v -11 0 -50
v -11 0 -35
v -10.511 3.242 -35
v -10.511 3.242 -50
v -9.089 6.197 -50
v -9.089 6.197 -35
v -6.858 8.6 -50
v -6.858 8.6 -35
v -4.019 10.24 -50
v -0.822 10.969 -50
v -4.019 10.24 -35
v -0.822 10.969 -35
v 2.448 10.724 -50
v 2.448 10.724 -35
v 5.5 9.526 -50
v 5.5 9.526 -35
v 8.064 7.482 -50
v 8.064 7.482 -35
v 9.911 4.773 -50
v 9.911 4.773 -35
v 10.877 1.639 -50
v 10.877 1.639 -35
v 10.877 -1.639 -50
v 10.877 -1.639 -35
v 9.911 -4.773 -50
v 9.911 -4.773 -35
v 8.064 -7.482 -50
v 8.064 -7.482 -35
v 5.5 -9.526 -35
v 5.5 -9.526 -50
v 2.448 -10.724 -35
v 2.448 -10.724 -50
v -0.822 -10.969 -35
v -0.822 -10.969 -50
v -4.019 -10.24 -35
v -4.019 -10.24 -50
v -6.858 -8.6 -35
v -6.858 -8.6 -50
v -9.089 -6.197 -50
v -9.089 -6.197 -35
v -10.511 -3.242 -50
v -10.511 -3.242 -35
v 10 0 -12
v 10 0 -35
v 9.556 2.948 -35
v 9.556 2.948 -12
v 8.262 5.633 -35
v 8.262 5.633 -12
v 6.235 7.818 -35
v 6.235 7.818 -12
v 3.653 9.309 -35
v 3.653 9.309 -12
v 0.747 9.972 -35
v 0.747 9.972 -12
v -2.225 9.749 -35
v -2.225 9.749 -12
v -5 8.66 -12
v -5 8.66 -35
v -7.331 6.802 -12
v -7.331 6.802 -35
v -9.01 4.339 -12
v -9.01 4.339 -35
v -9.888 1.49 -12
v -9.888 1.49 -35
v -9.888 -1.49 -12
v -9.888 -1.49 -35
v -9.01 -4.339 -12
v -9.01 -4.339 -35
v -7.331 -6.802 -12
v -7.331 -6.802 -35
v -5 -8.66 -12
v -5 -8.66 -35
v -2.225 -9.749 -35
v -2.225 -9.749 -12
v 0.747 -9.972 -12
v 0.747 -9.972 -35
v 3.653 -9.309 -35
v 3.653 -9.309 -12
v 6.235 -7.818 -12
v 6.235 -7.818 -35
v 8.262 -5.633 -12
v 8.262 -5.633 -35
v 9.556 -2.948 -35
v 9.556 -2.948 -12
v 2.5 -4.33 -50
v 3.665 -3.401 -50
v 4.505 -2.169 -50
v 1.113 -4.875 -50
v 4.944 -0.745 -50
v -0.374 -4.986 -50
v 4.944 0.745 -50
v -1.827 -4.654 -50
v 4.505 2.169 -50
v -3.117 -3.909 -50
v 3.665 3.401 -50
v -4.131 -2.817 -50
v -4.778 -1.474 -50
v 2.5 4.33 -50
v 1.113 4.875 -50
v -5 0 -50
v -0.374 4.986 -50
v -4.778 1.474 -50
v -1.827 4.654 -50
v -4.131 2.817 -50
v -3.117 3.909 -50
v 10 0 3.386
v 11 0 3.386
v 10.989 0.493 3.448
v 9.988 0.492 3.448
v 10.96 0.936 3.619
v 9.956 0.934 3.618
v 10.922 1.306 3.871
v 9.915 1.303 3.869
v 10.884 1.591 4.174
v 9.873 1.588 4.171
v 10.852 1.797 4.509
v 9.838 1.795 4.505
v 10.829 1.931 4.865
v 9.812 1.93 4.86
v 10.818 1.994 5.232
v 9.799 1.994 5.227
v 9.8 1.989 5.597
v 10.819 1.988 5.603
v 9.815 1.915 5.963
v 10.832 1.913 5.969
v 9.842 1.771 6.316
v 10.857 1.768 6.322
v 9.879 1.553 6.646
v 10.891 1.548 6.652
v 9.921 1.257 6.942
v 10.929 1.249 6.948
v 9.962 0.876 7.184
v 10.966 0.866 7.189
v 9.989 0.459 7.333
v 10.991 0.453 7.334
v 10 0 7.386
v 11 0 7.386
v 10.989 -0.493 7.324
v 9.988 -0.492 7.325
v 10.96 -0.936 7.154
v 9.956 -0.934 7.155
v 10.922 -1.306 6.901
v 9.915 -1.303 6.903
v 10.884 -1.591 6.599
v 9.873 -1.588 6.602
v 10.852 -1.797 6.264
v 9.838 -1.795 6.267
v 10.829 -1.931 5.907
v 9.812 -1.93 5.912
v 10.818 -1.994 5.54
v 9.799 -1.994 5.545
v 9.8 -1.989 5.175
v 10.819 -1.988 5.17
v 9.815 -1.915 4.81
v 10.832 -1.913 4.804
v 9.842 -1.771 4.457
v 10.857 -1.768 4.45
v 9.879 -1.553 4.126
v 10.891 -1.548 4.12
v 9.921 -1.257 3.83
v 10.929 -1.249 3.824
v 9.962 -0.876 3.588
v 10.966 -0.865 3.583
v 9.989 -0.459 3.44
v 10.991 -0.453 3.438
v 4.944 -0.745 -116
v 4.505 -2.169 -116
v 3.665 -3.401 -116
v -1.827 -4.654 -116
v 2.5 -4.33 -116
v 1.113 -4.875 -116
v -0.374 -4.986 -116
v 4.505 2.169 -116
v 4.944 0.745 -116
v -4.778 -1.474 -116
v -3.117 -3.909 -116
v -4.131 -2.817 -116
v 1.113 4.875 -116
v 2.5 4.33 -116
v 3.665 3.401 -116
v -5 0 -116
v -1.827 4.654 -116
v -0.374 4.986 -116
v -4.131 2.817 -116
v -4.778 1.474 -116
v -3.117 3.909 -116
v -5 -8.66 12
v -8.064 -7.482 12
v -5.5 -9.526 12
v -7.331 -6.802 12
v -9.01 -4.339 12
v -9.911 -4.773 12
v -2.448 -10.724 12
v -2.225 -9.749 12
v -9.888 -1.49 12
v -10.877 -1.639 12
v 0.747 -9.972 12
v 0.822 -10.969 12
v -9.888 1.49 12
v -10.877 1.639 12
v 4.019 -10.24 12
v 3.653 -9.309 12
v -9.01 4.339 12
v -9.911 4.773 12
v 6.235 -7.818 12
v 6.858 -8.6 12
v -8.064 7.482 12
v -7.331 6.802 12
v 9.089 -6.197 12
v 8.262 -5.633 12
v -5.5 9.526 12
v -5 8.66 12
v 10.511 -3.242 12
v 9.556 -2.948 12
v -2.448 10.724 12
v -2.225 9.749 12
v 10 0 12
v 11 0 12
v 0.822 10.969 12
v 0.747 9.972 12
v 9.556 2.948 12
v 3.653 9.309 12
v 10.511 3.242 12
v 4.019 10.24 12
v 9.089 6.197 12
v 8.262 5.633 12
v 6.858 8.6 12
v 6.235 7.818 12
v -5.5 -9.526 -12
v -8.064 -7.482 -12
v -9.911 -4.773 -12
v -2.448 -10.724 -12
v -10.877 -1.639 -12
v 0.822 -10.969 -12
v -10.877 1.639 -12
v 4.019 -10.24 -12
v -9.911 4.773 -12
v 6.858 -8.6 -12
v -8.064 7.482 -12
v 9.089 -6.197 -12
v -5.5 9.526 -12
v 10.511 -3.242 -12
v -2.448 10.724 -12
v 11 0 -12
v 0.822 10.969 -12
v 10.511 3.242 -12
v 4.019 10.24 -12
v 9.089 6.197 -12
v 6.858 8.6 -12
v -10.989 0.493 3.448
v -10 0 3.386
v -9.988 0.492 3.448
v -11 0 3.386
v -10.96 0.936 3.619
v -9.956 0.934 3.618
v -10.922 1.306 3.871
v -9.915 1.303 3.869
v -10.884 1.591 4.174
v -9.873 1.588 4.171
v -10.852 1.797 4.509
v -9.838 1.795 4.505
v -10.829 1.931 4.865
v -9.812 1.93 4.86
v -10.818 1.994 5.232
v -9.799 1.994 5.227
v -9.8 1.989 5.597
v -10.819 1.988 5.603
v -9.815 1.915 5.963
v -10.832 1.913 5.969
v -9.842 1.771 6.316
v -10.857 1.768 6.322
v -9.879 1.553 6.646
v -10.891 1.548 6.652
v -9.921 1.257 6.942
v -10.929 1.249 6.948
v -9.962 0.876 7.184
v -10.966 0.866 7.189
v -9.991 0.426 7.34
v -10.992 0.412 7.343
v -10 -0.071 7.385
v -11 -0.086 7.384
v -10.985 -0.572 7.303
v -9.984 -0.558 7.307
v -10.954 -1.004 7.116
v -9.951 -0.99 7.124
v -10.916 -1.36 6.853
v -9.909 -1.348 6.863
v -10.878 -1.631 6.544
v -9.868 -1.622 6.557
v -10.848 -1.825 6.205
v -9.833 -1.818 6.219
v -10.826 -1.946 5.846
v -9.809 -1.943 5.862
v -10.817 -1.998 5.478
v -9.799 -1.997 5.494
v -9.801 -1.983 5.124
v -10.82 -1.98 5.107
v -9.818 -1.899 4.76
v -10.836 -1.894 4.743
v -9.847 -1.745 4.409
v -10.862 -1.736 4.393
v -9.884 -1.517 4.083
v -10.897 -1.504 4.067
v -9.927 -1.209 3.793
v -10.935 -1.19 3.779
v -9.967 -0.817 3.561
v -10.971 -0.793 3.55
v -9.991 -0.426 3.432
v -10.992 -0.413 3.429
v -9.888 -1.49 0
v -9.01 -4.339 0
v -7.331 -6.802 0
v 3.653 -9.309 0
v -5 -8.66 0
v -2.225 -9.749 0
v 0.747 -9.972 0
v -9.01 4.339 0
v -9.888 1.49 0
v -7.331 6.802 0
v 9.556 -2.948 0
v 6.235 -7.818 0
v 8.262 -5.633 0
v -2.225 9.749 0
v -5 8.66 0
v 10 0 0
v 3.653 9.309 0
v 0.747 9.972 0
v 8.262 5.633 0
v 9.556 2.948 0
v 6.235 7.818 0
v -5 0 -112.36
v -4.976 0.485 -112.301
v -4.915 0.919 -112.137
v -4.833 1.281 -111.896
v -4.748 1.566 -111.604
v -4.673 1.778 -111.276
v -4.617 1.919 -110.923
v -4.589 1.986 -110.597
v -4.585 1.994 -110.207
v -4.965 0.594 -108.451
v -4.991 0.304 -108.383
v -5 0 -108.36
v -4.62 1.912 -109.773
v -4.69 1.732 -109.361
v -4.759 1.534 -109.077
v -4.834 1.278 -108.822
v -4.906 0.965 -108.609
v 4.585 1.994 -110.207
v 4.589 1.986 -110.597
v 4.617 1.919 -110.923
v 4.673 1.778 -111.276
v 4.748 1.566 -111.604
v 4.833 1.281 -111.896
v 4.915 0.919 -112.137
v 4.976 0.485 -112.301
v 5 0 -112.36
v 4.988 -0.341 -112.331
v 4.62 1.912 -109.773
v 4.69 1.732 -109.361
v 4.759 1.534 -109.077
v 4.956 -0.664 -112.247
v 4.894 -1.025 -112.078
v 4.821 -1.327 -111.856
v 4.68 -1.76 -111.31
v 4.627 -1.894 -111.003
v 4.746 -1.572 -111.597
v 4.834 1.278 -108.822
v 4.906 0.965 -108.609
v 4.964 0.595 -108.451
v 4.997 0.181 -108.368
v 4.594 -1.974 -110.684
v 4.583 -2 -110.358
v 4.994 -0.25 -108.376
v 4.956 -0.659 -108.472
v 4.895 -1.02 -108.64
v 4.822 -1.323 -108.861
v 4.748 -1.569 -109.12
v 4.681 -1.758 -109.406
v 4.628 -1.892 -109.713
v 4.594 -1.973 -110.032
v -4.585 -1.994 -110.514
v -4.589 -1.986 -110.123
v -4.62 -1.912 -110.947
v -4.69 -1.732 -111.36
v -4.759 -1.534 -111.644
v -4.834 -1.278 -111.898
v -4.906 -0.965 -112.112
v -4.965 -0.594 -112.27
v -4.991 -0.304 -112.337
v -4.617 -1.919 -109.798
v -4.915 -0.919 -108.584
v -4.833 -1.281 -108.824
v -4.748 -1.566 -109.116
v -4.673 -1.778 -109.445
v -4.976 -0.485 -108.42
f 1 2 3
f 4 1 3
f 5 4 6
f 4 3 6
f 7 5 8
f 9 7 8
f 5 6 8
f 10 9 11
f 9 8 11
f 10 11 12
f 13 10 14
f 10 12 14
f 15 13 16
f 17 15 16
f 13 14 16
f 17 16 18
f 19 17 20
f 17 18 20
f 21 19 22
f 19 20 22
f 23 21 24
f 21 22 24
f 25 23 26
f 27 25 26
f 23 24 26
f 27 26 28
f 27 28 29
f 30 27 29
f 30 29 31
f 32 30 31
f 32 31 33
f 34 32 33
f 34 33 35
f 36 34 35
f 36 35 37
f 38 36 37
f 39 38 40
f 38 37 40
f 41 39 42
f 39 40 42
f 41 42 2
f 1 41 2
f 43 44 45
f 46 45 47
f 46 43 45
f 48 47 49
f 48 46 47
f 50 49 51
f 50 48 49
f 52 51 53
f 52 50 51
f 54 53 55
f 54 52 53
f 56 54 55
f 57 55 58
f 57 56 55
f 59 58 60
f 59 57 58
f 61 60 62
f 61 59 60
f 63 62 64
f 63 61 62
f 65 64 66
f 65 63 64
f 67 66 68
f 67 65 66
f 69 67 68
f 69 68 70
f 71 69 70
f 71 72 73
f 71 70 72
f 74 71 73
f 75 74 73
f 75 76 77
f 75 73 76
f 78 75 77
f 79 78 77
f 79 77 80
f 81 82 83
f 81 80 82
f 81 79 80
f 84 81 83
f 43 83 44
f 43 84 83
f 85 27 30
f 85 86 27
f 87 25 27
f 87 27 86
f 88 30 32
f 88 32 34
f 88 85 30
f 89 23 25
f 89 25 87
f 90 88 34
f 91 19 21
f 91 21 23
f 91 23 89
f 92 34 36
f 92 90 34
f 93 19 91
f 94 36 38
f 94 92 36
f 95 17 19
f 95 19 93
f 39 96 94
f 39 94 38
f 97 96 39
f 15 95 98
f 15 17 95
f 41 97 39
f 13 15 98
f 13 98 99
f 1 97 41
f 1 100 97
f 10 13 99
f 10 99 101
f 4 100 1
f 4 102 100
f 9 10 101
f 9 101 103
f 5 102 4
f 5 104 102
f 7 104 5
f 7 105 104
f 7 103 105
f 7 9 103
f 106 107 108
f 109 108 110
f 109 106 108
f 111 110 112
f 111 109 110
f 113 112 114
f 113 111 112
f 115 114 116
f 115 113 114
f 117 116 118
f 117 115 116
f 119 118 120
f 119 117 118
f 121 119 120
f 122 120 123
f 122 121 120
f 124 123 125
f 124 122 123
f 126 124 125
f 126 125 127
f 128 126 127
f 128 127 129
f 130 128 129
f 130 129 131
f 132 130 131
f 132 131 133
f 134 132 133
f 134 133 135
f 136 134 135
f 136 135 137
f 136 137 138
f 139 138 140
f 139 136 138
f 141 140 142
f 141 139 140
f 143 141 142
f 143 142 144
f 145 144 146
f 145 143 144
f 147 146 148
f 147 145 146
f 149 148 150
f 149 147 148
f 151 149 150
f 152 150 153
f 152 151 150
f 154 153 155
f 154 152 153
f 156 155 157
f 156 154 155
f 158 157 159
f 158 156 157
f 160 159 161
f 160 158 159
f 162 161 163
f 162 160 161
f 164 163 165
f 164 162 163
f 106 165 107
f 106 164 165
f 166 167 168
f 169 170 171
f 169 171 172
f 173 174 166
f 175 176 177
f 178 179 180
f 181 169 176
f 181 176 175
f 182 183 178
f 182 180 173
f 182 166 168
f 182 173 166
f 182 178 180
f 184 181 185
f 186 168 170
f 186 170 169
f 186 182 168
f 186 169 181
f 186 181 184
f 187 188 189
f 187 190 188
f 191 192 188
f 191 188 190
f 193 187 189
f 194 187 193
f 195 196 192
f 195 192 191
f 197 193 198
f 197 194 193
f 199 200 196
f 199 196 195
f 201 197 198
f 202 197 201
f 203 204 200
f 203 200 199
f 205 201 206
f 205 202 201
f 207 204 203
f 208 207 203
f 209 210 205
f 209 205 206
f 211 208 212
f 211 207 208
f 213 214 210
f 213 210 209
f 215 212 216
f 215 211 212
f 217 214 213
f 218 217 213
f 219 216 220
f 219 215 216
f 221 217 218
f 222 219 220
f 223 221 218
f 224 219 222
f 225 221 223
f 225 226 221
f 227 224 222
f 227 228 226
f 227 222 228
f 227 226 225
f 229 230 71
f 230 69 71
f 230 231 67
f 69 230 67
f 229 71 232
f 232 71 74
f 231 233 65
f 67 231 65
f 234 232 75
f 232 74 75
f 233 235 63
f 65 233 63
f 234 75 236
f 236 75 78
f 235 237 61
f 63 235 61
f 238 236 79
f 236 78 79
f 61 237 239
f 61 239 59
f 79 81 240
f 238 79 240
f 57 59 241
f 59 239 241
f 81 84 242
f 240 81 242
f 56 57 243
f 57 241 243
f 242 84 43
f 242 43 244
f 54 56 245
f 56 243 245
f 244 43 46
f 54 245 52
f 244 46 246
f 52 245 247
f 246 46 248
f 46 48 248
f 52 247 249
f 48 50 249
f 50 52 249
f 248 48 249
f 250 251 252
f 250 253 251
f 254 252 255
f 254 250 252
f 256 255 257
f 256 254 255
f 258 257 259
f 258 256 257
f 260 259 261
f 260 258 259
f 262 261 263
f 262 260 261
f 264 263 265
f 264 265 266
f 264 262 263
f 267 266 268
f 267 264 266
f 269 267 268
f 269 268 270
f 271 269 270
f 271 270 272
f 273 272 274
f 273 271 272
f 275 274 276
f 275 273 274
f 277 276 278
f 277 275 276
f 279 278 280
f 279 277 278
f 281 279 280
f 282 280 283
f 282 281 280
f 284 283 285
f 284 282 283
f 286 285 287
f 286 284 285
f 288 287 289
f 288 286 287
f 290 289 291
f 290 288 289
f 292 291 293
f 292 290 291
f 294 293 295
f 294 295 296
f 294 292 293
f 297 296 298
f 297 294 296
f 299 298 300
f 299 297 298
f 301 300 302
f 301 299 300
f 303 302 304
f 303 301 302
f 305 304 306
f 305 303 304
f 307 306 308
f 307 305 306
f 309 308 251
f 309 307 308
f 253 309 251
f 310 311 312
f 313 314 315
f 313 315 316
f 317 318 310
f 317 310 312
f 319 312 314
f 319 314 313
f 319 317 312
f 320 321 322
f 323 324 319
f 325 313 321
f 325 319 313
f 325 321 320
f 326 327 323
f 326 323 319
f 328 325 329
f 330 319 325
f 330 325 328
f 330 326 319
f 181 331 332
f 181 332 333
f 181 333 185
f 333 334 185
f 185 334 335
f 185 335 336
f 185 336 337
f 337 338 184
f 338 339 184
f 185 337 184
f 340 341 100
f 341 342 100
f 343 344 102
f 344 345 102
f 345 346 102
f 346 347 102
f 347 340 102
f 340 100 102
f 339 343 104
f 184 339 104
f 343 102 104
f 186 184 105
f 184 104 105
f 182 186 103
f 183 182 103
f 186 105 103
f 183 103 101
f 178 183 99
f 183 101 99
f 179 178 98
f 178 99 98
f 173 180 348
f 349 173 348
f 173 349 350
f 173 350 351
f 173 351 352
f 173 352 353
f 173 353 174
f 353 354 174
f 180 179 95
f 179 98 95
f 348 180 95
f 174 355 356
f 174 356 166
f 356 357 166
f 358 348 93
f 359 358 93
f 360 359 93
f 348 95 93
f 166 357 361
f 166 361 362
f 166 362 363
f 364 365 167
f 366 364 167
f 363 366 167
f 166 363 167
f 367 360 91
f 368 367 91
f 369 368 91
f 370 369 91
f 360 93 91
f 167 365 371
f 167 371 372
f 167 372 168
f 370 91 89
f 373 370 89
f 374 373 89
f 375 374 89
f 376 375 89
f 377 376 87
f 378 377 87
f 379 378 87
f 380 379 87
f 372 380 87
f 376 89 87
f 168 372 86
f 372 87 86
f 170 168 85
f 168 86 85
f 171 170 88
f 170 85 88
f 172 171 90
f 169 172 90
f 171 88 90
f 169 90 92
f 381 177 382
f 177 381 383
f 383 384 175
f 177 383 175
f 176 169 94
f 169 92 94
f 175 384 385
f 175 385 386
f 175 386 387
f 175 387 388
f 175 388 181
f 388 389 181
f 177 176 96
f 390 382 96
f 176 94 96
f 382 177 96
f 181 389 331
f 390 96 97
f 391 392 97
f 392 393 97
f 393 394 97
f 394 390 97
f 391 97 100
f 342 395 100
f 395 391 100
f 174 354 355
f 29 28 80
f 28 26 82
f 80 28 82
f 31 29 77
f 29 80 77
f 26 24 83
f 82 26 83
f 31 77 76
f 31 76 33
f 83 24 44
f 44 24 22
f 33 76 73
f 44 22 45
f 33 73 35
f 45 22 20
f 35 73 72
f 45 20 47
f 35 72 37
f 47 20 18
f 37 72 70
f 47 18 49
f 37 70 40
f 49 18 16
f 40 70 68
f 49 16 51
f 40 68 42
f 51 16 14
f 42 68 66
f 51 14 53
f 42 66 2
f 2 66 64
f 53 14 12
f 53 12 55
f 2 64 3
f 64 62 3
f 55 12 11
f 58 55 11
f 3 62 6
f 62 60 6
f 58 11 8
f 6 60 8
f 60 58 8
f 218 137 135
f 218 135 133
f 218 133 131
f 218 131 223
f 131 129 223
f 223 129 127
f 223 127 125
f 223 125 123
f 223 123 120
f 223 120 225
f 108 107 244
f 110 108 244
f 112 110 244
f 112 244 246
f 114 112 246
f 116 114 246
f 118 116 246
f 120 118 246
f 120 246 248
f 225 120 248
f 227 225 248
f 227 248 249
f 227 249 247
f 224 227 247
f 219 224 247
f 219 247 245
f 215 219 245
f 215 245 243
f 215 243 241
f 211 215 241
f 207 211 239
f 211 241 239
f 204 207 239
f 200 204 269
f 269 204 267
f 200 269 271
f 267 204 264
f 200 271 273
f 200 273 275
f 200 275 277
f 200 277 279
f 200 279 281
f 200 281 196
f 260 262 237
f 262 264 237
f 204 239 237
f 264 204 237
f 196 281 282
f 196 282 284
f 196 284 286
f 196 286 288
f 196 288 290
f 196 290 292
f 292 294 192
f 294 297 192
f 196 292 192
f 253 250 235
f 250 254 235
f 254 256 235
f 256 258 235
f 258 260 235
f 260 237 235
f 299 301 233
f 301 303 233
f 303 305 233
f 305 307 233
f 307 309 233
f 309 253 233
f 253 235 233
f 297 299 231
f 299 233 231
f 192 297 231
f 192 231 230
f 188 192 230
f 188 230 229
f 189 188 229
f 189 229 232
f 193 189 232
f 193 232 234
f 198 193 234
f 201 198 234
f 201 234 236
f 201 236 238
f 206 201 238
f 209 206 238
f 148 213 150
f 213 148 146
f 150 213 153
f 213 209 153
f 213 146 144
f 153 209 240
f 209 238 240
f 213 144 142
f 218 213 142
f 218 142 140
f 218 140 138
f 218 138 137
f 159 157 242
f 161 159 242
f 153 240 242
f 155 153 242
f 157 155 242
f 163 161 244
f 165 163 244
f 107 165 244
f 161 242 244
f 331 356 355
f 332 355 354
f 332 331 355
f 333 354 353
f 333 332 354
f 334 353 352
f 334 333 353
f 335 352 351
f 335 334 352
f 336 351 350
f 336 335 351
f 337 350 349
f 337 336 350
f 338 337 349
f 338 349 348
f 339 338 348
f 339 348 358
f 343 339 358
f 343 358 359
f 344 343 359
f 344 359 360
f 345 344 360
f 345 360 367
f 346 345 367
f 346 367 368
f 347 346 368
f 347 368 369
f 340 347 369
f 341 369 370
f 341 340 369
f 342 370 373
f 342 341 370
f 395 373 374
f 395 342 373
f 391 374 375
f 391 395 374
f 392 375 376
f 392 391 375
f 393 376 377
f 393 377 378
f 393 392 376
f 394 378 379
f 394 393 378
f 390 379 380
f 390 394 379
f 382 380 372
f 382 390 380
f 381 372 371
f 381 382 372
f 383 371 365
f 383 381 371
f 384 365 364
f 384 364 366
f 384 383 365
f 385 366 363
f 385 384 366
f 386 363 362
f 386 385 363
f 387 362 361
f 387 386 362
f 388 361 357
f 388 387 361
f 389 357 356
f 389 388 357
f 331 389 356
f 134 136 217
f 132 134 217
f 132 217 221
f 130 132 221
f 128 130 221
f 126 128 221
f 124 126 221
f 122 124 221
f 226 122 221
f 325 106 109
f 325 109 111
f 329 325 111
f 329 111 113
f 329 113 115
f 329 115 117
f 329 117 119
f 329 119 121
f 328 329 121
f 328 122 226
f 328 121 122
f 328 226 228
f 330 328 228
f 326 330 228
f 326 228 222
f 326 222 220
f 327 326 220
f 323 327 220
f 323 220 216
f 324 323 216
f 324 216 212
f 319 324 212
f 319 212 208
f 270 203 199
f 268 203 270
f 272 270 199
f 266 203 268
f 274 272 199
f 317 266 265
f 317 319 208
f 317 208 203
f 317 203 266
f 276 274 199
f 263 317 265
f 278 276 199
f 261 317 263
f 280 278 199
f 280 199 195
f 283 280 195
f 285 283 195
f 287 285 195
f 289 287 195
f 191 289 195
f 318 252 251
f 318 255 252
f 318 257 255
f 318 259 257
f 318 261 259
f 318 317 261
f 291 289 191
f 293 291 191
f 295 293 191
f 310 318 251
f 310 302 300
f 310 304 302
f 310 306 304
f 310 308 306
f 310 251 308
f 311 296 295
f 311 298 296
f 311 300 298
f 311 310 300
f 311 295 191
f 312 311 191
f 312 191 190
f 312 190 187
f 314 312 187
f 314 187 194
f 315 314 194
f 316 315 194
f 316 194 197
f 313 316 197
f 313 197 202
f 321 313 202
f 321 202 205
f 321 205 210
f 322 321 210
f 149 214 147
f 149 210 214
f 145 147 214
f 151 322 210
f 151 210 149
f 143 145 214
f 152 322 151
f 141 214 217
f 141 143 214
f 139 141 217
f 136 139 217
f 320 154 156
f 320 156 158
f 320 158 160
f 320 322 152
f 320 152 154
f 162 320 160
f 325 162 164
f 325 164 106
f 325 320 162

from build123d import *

# Parameters (mm, degrees)
SKETCH1_R                = 10
BOSS_EXTRUDE1_DEPTH      = 50
EXTRUDE_THIN1_START      = -15
SKETCH2_R                = 11
SKETCH2_R_2              = 10
EXTRUDE_THIN1_DEPTH      = 15
SKETCH3_R                = 5
BOSS_EXTRUDE2_DEPTH      = 66
CUT_EXTRUDE3_DEPTH       = 118.038455219
CUT_EXTRUDE3_DEPTH_BACK  = 118.038455219
SKETCH4_R                = 2
EXTRUDE_THIN2_DEPTH      = 12
EXTRUDE_THIN2_DEPTH_BACK = 12
SKETCH5_R                = 11
SKETCH5_R_2              = 10
CUT_EXTRUDE4_DEPTH       = 118.038455318
CUT_EXTRUDE4_DEPTH_BACK  = 118.038455318
SKETCH7_R                = 2


with BuildPart() as part:
    # Sketch1 → Boss-Extrude1 (new body)
    with BuildSketch(Plane.XY):
        Circle(SKETCH1_R)
    extrude(amount=-BOSS_EXTRUDE1_DEPTH)

    # Sketch2 → Extrude-Thin1 (add)
    with BuildSketch(Plane(origin=(0, 0, -50), x_dir=(-1, 0, 0), z_dir=(0, 0, -1)).offset(EXTRUDE_THIN1_START)):
        Circle(SKETCH2_R)
        Circle(SKETCH2_R_2, mode=Mode.SUBTRACT)
    extrude(amount=EXTRUDE_THIN1_DEPTH)

    # Sketch3 → Boss-Extrude2 (add)
    with BuildSketch(Plane(origin=(0, 0, -50), x_dir=(-1, 0, 0), z_dir=(0, 0, -1))):
        Circle(SKETCH3_R)
    extrude(amount=BOSS_EXTRUDE2_DEPTH)

    # Sketch4 → Cut-Extrude3 (cut, two sides: drawn at the far end of the back side and taken through both)
    with BuildSketch(Plane(origin=(0, 0, 0), x_dir=(0, 0, -1), z_dir=(1, 0, 0)).offset(-CUT_EXTRUDE3_DEPTH_BACK)):
        with Locations((110.360244091, 0)):
            Circle(SKETCH4_R)
    extrude(amount=CUT_EXTRUDE3_DEPTH + CUT_EXTRUDE3_DEPTH_BACK, mode=Mode.SUBTRACT)

    # Sketch5 → Extrude-Thin2 (add, two sides: drawn at the far end of the back side and taken through both)
    with BuildSketch(Plane.XY.offset(-EXTRUDE_THIN2_DEPTH_BACK)):
        Circle(SKETCH5_R)
        Circle(SKETCH5_R_2, mode=Mode.SUBTRACT)
    extrude(amount=EXTRUDE_THIN2_DEPTH + EXTRUDE_THIN2_DEPTH_BACK)

    # Sketch7 → Cut-Extrude4 (cut, two sides: drawn at the far end of the back side and taken through both)
    with BuildSketch(Plane(origin=(0, 0, 0), x_dir=(0, 0, -1), z_dir=(1, 0, 0)).offset(-CUT_EXTRUDE4_DEPTH_BACK)):
        with Locations((-5.38623627, 0)):
            Circle(SKETCH7_R)
    extrude(amount=CUT_EXTRUDE4_DEPTH + CUT_EXTRUDE4_DEPTH_BACK, mode=Mode.SUBTRACT)


solid = part.part
